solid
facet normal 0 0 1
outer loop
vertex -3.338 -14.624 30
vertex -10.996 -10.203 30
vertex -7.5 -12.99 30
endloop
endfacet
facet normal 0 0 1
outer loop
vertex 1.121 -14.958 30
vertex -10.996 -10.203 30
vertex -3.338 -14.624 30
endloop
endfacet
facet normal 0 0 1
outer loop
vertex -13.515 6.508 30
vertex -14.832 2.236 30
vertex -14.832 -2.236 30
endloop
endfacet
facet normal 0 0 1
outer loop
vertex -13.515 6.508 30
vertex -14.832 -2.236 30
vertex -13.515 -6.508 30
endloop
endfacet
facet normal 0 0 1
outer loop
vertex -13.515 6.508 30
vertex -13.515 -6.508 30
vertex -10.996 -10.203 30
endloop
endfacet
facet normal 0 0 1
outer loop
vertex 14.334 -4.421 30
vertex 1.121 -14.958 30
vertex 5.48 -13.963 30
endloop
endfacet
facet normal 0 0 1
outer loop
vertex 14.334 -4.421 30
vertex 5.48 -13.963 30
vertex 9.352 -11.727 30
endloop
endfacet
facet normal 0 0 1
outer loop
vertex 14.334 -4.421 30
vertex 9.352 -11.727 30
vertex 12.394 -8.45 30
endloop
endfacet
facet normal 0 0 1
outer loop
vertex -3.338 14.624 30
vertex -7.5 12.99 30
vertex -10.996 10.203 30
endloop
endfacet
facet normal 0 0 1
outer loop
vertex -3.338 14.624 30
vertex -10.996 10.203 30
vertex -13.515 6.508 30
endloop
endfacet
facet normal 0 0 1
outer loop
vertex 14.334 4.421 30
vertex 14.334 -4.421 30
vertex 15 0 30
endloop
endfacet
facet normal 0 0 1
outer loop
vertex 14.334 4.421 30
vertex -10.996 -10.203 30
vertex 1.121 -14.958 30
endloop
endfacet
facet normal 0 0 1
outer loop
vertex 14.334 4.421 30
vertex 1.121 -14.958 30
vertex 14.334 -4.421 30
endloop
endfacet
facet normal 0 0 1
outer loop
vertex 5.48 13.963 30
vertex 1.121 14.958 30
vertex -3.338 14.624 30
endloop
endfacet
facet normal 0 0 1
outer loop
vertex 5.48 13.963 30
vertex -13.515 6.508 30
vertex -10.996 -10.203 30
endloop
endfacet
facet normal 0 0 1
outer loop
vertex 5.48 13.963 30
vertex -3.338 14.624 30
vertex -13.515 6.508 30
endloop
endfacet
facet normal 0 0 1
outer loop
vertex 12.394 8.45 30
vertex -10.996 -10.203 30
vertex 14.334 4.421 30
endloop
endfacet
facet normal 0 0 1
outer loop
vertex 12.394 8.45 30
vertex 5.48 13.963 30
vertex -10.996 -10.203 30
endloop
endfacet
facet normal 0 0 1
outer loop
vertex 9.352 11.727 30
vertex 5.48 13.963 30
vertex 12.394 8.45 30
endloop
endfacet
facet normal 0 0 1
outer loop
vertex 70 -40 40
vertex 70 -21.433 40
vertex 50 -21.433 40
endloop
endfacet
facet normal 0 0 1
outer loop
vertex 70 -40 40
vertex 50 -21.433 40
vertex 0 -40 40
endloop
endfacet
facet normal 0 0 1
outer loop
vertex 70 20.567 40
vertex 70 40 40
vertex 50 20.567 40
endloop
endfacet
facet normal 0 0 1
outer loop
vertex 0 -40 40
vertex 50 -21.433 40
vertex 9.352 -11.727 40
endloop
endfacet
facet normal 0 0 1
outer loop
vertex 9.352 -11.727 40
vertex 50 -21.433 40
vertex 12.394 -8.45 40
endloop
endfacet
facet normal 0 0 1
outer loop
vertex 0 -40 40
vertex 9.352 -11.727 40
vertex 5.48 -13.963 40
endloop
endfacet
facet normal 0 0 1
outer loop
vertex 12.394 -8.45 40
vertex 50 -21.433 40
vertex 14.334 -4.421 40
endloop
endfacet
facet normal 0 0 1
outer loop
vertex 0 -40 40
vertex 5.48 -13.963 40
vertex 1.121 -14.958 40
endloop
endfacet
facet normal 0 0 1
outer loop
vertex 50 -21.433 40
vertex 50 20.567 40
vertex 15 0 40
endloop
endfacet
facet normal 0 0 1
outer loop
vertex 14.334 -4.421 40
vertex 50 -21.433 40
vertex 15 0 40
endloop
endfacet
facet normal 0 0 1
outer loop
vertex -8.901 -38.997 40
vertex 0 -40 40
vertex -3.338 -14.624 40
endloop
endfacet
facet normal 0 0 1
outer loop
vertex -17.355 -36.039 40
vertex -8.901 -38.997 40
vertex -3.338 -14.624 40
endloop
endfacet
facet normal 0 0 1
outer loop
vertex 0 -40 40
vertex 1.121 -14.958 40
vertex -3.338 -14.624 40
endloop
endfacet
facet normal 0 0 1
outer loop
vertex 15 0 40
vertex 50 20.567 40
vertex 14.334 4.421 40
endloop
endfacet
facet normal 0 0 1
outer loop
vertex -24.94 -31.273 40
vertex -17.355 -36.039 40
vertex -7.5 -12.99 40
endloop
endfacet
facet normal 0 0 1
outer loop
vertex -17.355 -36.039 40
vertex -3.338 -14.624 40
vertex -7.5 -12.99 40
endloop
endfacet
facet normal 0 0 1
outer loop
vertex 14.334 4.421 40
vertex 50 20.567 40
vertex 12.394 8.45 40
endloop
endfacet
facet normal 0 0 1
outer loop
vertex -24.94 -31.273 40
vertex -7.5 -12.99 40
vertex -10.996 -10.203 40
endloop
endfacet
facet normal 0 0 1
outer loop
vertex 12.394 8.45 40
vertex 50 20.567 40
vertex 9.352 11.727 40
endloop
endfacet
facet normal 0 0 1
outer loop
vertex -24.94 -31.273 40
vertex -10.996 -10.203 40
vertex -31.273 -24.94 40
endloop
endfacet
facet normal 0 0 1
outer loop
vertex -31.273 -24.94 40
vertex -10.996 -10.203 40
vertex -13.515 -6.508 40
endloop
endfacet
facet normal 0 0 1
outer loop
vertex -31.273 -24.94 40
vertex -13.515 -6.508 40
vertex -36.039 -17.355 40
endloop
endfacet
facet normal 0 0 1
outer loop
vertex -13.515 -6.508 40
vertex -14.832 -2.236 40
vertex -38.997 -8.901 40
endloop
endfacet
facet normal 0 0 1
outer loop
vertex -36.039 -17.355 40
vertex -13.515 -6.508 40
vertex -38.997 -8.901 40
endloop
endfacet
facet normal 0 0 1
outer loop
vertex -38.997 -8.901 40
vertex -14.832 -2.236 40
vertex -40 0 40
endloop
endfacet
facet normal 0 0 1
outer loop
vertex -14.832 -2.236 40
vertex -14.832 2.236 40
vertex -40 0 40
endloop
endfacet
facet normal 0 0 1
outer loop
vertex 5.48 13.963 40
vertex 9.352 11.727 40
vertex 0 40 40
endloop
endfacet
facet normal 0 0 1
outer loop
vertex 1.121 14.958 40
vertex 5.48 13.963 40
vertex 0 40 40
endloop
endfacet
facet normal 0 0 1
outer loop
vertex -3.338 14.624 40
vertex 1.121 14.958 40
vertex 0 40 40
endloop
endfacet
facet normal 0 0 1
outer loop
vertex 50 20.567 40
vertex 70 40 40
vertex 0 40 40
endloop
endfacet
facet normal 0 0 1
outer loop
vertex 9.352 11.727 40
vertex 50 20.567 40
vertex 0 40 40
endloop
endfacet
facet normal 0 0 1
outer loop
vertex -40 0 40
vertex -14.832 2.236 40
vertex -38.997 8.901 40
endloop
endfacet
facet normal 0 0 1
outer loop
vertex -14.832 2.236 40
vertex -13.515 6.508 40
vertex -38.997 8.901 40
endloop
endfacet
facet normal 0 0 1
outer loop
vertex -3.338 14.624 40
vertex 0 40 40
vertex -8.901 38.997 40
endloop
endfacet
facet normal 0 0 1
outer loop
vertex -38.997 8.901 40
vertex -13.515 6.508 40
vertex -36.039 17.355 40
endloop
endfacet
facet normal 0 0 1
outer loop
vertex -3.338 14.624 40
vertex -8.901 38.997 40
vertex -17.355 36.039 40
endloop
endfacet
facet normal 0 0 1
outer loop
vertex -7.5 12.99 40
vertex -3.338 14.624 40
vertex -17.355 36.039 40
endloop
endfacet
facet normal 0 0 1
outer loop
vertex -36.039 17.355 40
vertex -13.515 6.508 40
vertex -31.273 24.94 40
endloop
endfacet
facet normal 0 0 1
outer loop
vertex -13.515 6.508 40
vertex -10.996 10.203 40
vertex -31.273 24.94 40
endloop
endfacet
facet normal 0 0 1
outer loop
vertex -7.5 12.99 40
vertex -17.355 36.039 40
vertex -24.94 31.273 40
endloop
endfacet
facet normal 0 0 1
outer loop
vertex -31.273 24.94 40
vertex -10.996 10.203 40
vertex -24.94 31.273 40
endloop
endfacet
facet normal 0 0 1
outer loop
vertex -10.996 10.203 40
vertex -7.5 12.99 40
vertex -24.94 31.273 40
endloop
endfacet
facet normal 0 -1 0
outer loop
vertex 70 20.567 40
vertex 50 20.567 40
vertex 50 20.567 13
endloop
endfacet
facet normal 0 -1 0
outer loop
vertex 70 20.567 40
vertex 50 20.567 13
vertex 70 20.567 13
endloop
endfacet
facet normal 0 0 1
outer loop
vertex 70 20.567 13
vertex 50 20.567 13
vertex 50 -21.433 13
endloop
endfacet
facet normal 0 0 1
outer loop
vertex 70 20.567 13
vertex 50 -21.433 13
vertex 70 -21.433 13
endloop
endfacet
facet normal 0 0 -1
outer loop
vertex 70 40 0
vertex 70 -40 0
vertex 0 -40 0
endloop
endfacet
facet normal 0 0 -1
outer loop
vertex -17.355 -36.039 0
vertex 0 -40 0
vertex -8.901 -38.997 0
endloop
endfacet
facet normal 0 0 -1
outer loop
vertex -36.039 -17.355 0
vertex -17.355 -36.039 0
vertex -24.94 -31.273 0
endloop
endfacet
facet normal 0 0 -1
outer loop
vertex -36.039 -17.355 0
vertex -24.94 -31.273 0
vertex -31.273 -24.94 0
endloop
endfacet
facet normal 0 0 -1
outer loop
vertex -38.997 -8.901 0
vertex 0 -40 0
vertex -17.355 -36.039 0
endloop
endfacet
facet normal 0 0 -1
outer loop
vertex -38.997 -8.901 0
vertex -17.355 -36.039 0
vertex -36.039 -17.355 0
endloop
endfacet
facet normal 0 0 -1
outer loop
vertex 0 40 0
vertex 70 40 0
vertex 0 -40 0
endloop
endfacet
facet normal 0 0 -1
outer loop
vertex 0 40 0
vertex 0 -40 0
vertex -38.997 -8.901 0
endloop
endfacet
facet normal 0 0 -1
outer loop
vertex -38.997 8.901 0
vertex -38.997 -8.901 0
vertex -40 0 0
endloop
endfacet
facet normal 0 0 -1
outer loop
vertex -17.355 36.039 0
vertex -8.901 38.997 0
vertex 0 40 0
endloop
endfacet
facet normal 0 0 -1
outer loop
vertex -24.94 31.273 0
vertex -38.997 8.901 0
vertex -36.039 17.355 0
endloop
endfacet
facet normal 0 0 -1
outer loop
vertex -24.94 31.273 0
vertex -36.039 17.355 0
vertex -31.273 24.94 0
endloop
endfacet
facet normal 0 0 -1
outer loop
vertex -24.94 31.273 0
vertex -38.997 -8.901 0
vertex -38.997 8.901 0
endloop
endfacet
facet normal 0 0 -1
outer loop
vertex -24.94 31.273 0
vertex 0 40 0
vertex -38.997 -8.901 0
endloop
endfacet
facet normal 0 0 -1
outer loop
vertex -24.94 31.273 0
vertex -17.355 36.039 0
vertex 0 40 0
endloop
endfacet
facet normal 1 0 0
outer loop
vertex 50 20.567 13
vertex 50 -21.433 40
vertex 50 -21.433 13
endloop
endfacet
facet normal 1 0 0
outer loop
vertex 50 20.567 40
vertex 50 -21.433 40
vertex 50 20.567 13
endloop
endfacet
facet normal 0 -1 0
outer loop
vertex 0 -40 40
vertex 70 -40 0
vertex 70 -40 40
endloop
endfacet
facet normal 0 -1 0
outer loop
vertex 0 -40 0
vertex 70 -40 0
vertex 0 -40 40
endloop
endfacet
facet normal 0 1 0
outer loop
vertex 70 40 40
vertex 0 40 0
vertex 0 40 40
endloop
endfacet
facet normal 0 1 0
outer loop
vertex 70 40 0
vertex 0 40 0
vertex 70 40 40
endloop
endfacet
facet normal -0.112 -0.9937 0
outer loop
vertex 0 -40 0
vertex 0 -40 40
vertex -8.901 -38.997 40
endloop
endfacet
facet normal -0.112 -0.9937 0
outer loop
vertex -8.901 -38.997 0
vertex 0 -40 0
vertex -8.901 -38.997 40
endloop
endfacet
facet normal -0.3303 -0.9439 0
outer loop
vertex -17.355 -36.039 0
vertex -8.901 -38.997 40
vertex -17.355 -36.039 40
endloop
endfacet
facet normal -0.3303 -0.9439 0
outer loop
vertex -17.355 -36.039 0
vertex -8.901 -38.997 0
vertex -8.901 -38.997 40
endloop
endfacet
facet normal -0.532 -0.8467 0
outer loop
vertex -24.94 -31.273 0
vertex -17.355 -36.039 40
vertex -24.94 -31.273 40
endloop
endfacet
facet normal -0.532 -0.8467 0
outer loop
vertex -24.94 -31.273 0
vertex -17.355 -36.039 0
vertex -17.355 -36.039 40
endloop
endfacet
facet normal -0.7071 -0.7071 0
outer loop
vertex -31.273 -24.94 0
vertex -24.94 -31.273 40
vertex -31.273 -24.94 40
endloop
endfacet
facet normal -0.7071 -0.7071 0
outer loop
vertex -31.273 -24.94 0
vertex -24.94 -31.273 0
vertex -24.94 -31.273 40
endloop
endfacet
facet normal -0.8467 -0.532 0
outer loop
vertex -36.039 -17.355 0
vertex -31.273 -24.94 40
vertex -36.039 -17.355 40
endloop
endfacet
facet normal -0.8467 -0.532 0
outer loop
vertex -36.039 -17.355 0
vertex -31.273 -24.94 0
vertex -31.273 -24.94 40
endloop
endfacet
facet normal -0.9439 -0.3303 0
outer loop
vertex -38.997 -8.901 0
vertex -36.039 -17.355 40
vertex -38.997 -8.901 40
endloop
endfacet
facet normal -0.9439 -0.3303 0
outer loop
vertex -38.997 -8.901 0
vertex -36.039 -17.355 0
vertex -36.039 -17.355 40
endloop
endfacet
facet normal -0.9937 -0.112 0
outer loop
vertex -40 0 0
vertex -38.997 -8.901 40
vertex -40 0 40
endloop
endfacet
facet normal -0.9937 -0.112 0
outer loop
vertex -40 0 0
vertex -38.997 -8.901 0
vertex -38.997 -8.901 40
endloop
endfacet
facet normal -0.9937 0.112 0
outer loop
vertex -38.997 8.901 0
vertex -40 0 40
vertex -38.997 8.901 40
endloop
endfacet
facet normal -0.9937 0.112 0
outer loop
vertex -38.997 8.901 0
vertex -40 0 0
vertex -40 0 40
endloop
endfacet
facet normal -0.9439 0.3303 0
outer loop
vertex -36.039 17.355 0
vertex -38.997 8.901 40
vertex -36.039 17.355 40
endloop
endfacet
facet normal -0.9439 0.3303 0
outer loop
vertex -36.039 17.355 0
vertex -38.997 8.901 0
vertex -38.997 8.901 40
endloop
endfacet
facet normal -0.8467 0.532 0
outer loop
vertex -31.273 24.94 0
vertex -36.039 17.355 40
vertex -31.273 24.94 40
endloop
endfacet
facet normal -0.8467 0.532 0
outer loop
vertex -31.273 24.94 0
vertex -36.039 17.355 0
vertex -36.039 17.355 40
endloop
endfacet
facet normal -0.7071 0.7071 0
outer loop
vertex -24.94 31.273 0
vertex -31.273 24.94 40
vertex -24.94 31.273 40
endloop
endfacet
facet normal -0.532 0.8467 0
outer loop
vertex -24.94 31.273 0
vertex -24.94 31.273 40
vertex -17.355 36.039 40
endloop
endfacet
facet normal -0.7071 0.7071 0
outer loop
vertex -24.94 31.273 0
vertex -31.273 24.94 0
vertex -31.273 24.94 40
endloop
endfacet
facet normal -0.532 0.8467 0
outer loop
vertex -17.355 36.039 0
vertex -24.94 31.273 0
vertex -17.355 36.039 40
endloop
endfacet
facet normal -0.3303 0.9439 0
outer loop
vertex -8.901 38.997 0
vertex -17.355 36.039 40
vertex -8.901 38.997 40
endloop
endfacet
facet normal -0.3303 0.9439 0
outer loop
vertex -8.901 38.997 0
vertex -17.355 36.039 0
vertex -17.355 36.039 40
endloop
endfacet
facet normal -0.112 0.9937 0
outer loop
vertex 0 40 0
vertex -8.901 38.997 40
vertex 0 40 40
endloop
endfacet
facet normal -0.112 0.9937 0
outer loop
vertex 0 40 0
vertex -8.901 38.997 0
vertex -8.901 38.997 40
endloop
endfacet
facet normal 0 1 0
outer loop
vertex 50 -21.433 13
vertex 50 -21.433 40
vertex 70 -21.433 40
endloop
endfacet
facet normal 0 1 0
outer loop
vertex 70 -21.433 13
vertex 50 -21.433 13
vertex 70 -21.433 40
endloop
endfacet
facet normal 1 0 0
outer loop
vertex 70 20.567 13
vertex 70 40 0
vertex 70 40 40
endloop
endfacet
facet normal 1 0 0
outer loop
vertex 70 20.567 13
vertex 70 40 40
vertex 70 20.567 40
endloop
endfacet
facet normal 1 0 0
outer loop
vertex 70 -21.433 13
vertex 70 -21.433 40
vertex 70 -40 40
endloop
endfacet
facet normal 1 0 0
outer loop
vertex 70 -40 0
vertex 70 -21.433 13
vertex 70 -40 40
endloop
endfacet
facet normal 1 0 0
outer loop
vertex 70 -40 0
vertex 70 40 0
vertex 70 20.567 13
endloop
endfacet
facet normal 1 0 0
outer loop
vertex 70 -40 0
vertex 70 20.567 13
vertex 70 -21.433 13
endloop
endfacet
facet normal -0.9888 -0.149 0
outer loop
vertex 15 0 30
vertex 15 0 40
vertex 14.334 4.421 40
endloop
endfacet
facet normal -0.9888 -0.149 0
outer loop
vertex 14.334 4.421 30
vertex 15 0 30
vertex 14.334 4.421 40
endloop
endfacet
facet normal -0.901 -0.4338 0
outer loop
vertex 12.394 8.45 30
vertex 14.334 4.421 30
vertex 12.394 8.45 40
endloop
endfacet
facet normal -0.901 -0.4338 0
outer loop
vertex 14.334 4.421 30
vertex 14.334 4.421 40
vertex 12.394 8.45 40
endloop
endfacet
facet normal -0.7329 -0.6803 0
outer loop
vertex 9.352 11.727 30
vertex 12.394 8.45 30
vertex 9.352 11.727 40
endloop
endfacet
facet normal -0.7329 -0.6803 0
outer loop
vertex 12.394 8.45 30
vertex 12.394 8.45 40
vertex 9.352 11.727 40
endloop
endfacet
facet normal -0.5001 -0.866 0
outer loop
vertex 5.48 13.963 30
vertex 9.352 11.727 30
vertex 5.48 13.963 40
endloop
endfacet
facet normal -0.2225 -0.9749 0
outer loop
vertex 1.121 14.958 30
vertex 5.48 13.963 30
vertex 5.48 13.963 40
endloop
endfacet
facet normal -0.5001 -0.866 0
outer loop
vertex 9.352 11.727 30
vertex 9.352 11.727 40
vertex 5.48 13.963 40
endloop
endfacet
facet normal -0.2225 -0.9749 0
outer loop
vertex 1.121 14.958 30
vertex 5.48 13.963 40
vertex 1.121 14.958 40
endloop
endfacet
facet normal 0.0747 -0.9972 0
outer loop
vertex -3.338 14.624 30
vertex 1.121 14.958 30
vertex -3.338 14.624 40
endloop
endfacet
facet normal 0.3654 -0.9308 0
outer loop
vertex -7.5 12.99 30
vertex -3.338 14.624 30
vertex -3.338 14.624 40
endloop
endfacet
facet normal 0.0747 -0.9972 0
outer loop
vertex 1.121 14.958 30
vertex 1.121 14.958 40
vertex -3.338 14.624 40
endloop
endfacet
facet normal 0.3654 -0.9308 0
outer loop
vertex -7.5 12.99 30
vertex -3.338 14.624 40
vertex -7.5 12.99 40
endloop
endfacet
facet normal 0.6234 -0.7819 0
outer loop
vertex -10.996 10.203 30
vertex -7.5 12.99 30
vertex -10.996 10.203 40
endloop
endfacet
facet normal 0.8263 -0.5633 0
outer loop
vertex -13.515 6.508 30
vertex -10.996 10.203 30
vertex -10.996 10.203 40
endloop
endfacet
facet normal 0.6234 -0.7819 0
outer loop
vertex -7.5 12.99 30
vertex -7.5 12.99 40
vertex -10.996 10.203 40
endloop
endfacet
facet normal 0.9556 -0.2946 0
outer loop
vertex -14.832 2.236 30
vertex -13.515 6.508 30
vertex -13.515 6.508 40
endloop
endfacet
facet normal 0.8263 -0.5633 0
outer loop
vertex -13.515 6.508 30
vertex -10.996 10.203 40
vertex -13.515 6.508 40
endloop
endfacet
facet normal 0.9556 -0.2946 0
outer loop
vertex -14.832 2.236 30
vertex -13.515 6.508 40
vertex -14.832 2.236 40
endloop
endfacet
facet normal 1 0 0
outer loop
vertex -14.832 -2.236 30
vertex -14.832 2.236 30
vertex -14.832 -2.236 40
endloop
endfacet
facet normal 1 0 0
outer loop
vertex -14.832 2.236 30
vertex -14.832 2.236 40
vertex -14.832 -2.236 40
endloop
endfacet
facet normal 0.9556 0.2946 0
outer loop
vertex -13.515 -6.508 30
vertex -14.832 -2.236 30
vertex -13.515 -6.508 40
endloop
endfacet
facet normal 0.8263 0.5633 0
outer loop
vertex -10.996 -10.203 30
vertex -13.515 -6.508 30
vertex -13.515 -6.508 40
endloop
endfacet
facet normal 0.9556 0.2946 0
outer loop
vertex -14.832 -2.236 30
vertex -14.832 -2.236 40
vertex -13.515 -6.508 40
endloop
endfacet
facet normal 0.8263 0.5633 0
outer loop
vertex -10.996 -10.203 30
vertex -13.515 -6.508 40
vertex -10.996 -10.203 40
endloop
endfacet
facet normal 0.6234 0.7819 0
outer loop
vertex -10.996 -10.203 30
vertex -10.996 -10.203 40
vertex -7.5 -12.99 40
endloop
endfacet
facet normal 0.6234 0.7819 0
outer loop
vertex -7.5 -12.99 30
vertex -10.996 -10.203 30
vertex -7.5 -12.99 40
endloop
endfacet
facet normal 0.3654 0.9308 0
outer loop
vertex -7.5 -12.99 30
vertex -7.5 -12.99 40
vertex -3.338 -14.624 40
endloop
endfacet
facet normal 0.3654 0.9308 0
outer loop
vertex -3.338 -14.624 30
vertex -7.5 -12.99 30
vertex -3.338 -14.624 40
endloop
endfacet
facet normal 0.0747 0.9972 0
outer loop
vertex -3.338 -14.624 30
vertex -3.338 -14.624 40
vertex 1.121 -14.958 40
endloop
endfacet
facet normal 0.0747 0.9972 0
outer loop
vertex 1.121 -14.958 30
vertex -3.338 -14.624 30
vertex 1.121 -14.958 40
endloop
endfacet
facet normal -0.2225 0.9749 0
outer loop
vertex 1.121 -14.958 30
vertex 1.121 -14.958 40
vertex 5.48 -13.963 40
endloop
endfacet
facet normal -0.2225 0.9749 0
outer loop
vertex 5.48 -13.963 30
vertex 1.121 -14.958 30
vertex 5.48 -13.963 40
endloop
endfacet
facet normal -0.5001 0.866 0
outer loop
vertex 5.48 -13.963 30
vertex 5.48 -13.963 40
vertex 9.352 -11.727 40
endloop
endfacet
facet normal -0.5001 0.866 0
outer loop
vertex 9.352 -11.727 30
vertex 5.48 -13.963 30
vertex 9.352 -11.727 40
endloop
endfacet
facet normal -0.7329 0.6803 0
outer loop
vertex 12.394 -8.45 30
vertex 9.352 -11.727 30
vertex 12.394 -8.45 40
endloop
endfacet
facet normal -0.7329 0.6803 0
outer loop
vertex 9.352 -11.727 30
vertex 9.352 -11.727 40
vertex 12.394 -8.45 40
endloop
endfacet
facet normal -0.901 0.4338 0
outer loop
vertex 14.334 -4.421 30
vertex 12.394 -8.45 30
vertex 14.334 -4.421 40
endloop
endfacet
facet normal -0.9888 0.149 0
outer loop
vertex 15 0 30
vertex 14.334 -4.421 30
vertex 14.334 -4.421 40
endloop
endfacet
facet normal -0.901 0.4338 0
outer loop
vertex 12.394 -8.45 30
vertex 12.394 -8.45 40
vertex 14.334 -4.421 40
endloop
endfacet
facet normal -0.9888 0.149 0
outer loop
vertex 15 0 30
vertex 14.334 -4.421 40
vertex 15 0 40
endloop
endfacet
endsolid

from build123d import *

# Parameters (mm, degrees)
BOSS_EXTRUDE1_DEPTH = 40
SKETCH2_W           = 20
SKETCH2_H           = 42
CUT_EXTRUDE1_DEPTH  = 27
SKETCH3_R           = 15
CUT_EXTRUDE2_DEPTH  = 10


with BuildPart() as part:
    # Sketch1 → Boss-Extrude1 (new body)
    with BuildSketch(Plane.XY):
        with BuildLine():
            Line((0, 40), (70, 40))
            Line((70, 40), (70, -40))
            Line((70, -40), (0, -40))
            ThreePointArc((0, -40), (-40, 0), (0, 40))
        make_face()
    extrude(amount=BOSS_EXTRUDE1_DEPTH)

    # Sketch2 → Cut-Extrude1 (cut)
    with BuildSketch(Plane.XY.offset(40)):
        with Locations((60, -0.432961974)):
            Rectangle(SKETCH2_W, SKETCH2_H)
    extrude(amount=-CUT_EXTRUDE1_DEPTH, mode=Mode.SUBTRACT)

    # Sketch3 → Cut-Extrude2 (cut)
    with BuildSketch(Plane.XY.offset(40)):
        Circle(SKETCH3_R)
    extrude(amount=-CUT_EXTRUDE2_DEPTH, mode=Mode.SUBTRACT)


solid = part.part
